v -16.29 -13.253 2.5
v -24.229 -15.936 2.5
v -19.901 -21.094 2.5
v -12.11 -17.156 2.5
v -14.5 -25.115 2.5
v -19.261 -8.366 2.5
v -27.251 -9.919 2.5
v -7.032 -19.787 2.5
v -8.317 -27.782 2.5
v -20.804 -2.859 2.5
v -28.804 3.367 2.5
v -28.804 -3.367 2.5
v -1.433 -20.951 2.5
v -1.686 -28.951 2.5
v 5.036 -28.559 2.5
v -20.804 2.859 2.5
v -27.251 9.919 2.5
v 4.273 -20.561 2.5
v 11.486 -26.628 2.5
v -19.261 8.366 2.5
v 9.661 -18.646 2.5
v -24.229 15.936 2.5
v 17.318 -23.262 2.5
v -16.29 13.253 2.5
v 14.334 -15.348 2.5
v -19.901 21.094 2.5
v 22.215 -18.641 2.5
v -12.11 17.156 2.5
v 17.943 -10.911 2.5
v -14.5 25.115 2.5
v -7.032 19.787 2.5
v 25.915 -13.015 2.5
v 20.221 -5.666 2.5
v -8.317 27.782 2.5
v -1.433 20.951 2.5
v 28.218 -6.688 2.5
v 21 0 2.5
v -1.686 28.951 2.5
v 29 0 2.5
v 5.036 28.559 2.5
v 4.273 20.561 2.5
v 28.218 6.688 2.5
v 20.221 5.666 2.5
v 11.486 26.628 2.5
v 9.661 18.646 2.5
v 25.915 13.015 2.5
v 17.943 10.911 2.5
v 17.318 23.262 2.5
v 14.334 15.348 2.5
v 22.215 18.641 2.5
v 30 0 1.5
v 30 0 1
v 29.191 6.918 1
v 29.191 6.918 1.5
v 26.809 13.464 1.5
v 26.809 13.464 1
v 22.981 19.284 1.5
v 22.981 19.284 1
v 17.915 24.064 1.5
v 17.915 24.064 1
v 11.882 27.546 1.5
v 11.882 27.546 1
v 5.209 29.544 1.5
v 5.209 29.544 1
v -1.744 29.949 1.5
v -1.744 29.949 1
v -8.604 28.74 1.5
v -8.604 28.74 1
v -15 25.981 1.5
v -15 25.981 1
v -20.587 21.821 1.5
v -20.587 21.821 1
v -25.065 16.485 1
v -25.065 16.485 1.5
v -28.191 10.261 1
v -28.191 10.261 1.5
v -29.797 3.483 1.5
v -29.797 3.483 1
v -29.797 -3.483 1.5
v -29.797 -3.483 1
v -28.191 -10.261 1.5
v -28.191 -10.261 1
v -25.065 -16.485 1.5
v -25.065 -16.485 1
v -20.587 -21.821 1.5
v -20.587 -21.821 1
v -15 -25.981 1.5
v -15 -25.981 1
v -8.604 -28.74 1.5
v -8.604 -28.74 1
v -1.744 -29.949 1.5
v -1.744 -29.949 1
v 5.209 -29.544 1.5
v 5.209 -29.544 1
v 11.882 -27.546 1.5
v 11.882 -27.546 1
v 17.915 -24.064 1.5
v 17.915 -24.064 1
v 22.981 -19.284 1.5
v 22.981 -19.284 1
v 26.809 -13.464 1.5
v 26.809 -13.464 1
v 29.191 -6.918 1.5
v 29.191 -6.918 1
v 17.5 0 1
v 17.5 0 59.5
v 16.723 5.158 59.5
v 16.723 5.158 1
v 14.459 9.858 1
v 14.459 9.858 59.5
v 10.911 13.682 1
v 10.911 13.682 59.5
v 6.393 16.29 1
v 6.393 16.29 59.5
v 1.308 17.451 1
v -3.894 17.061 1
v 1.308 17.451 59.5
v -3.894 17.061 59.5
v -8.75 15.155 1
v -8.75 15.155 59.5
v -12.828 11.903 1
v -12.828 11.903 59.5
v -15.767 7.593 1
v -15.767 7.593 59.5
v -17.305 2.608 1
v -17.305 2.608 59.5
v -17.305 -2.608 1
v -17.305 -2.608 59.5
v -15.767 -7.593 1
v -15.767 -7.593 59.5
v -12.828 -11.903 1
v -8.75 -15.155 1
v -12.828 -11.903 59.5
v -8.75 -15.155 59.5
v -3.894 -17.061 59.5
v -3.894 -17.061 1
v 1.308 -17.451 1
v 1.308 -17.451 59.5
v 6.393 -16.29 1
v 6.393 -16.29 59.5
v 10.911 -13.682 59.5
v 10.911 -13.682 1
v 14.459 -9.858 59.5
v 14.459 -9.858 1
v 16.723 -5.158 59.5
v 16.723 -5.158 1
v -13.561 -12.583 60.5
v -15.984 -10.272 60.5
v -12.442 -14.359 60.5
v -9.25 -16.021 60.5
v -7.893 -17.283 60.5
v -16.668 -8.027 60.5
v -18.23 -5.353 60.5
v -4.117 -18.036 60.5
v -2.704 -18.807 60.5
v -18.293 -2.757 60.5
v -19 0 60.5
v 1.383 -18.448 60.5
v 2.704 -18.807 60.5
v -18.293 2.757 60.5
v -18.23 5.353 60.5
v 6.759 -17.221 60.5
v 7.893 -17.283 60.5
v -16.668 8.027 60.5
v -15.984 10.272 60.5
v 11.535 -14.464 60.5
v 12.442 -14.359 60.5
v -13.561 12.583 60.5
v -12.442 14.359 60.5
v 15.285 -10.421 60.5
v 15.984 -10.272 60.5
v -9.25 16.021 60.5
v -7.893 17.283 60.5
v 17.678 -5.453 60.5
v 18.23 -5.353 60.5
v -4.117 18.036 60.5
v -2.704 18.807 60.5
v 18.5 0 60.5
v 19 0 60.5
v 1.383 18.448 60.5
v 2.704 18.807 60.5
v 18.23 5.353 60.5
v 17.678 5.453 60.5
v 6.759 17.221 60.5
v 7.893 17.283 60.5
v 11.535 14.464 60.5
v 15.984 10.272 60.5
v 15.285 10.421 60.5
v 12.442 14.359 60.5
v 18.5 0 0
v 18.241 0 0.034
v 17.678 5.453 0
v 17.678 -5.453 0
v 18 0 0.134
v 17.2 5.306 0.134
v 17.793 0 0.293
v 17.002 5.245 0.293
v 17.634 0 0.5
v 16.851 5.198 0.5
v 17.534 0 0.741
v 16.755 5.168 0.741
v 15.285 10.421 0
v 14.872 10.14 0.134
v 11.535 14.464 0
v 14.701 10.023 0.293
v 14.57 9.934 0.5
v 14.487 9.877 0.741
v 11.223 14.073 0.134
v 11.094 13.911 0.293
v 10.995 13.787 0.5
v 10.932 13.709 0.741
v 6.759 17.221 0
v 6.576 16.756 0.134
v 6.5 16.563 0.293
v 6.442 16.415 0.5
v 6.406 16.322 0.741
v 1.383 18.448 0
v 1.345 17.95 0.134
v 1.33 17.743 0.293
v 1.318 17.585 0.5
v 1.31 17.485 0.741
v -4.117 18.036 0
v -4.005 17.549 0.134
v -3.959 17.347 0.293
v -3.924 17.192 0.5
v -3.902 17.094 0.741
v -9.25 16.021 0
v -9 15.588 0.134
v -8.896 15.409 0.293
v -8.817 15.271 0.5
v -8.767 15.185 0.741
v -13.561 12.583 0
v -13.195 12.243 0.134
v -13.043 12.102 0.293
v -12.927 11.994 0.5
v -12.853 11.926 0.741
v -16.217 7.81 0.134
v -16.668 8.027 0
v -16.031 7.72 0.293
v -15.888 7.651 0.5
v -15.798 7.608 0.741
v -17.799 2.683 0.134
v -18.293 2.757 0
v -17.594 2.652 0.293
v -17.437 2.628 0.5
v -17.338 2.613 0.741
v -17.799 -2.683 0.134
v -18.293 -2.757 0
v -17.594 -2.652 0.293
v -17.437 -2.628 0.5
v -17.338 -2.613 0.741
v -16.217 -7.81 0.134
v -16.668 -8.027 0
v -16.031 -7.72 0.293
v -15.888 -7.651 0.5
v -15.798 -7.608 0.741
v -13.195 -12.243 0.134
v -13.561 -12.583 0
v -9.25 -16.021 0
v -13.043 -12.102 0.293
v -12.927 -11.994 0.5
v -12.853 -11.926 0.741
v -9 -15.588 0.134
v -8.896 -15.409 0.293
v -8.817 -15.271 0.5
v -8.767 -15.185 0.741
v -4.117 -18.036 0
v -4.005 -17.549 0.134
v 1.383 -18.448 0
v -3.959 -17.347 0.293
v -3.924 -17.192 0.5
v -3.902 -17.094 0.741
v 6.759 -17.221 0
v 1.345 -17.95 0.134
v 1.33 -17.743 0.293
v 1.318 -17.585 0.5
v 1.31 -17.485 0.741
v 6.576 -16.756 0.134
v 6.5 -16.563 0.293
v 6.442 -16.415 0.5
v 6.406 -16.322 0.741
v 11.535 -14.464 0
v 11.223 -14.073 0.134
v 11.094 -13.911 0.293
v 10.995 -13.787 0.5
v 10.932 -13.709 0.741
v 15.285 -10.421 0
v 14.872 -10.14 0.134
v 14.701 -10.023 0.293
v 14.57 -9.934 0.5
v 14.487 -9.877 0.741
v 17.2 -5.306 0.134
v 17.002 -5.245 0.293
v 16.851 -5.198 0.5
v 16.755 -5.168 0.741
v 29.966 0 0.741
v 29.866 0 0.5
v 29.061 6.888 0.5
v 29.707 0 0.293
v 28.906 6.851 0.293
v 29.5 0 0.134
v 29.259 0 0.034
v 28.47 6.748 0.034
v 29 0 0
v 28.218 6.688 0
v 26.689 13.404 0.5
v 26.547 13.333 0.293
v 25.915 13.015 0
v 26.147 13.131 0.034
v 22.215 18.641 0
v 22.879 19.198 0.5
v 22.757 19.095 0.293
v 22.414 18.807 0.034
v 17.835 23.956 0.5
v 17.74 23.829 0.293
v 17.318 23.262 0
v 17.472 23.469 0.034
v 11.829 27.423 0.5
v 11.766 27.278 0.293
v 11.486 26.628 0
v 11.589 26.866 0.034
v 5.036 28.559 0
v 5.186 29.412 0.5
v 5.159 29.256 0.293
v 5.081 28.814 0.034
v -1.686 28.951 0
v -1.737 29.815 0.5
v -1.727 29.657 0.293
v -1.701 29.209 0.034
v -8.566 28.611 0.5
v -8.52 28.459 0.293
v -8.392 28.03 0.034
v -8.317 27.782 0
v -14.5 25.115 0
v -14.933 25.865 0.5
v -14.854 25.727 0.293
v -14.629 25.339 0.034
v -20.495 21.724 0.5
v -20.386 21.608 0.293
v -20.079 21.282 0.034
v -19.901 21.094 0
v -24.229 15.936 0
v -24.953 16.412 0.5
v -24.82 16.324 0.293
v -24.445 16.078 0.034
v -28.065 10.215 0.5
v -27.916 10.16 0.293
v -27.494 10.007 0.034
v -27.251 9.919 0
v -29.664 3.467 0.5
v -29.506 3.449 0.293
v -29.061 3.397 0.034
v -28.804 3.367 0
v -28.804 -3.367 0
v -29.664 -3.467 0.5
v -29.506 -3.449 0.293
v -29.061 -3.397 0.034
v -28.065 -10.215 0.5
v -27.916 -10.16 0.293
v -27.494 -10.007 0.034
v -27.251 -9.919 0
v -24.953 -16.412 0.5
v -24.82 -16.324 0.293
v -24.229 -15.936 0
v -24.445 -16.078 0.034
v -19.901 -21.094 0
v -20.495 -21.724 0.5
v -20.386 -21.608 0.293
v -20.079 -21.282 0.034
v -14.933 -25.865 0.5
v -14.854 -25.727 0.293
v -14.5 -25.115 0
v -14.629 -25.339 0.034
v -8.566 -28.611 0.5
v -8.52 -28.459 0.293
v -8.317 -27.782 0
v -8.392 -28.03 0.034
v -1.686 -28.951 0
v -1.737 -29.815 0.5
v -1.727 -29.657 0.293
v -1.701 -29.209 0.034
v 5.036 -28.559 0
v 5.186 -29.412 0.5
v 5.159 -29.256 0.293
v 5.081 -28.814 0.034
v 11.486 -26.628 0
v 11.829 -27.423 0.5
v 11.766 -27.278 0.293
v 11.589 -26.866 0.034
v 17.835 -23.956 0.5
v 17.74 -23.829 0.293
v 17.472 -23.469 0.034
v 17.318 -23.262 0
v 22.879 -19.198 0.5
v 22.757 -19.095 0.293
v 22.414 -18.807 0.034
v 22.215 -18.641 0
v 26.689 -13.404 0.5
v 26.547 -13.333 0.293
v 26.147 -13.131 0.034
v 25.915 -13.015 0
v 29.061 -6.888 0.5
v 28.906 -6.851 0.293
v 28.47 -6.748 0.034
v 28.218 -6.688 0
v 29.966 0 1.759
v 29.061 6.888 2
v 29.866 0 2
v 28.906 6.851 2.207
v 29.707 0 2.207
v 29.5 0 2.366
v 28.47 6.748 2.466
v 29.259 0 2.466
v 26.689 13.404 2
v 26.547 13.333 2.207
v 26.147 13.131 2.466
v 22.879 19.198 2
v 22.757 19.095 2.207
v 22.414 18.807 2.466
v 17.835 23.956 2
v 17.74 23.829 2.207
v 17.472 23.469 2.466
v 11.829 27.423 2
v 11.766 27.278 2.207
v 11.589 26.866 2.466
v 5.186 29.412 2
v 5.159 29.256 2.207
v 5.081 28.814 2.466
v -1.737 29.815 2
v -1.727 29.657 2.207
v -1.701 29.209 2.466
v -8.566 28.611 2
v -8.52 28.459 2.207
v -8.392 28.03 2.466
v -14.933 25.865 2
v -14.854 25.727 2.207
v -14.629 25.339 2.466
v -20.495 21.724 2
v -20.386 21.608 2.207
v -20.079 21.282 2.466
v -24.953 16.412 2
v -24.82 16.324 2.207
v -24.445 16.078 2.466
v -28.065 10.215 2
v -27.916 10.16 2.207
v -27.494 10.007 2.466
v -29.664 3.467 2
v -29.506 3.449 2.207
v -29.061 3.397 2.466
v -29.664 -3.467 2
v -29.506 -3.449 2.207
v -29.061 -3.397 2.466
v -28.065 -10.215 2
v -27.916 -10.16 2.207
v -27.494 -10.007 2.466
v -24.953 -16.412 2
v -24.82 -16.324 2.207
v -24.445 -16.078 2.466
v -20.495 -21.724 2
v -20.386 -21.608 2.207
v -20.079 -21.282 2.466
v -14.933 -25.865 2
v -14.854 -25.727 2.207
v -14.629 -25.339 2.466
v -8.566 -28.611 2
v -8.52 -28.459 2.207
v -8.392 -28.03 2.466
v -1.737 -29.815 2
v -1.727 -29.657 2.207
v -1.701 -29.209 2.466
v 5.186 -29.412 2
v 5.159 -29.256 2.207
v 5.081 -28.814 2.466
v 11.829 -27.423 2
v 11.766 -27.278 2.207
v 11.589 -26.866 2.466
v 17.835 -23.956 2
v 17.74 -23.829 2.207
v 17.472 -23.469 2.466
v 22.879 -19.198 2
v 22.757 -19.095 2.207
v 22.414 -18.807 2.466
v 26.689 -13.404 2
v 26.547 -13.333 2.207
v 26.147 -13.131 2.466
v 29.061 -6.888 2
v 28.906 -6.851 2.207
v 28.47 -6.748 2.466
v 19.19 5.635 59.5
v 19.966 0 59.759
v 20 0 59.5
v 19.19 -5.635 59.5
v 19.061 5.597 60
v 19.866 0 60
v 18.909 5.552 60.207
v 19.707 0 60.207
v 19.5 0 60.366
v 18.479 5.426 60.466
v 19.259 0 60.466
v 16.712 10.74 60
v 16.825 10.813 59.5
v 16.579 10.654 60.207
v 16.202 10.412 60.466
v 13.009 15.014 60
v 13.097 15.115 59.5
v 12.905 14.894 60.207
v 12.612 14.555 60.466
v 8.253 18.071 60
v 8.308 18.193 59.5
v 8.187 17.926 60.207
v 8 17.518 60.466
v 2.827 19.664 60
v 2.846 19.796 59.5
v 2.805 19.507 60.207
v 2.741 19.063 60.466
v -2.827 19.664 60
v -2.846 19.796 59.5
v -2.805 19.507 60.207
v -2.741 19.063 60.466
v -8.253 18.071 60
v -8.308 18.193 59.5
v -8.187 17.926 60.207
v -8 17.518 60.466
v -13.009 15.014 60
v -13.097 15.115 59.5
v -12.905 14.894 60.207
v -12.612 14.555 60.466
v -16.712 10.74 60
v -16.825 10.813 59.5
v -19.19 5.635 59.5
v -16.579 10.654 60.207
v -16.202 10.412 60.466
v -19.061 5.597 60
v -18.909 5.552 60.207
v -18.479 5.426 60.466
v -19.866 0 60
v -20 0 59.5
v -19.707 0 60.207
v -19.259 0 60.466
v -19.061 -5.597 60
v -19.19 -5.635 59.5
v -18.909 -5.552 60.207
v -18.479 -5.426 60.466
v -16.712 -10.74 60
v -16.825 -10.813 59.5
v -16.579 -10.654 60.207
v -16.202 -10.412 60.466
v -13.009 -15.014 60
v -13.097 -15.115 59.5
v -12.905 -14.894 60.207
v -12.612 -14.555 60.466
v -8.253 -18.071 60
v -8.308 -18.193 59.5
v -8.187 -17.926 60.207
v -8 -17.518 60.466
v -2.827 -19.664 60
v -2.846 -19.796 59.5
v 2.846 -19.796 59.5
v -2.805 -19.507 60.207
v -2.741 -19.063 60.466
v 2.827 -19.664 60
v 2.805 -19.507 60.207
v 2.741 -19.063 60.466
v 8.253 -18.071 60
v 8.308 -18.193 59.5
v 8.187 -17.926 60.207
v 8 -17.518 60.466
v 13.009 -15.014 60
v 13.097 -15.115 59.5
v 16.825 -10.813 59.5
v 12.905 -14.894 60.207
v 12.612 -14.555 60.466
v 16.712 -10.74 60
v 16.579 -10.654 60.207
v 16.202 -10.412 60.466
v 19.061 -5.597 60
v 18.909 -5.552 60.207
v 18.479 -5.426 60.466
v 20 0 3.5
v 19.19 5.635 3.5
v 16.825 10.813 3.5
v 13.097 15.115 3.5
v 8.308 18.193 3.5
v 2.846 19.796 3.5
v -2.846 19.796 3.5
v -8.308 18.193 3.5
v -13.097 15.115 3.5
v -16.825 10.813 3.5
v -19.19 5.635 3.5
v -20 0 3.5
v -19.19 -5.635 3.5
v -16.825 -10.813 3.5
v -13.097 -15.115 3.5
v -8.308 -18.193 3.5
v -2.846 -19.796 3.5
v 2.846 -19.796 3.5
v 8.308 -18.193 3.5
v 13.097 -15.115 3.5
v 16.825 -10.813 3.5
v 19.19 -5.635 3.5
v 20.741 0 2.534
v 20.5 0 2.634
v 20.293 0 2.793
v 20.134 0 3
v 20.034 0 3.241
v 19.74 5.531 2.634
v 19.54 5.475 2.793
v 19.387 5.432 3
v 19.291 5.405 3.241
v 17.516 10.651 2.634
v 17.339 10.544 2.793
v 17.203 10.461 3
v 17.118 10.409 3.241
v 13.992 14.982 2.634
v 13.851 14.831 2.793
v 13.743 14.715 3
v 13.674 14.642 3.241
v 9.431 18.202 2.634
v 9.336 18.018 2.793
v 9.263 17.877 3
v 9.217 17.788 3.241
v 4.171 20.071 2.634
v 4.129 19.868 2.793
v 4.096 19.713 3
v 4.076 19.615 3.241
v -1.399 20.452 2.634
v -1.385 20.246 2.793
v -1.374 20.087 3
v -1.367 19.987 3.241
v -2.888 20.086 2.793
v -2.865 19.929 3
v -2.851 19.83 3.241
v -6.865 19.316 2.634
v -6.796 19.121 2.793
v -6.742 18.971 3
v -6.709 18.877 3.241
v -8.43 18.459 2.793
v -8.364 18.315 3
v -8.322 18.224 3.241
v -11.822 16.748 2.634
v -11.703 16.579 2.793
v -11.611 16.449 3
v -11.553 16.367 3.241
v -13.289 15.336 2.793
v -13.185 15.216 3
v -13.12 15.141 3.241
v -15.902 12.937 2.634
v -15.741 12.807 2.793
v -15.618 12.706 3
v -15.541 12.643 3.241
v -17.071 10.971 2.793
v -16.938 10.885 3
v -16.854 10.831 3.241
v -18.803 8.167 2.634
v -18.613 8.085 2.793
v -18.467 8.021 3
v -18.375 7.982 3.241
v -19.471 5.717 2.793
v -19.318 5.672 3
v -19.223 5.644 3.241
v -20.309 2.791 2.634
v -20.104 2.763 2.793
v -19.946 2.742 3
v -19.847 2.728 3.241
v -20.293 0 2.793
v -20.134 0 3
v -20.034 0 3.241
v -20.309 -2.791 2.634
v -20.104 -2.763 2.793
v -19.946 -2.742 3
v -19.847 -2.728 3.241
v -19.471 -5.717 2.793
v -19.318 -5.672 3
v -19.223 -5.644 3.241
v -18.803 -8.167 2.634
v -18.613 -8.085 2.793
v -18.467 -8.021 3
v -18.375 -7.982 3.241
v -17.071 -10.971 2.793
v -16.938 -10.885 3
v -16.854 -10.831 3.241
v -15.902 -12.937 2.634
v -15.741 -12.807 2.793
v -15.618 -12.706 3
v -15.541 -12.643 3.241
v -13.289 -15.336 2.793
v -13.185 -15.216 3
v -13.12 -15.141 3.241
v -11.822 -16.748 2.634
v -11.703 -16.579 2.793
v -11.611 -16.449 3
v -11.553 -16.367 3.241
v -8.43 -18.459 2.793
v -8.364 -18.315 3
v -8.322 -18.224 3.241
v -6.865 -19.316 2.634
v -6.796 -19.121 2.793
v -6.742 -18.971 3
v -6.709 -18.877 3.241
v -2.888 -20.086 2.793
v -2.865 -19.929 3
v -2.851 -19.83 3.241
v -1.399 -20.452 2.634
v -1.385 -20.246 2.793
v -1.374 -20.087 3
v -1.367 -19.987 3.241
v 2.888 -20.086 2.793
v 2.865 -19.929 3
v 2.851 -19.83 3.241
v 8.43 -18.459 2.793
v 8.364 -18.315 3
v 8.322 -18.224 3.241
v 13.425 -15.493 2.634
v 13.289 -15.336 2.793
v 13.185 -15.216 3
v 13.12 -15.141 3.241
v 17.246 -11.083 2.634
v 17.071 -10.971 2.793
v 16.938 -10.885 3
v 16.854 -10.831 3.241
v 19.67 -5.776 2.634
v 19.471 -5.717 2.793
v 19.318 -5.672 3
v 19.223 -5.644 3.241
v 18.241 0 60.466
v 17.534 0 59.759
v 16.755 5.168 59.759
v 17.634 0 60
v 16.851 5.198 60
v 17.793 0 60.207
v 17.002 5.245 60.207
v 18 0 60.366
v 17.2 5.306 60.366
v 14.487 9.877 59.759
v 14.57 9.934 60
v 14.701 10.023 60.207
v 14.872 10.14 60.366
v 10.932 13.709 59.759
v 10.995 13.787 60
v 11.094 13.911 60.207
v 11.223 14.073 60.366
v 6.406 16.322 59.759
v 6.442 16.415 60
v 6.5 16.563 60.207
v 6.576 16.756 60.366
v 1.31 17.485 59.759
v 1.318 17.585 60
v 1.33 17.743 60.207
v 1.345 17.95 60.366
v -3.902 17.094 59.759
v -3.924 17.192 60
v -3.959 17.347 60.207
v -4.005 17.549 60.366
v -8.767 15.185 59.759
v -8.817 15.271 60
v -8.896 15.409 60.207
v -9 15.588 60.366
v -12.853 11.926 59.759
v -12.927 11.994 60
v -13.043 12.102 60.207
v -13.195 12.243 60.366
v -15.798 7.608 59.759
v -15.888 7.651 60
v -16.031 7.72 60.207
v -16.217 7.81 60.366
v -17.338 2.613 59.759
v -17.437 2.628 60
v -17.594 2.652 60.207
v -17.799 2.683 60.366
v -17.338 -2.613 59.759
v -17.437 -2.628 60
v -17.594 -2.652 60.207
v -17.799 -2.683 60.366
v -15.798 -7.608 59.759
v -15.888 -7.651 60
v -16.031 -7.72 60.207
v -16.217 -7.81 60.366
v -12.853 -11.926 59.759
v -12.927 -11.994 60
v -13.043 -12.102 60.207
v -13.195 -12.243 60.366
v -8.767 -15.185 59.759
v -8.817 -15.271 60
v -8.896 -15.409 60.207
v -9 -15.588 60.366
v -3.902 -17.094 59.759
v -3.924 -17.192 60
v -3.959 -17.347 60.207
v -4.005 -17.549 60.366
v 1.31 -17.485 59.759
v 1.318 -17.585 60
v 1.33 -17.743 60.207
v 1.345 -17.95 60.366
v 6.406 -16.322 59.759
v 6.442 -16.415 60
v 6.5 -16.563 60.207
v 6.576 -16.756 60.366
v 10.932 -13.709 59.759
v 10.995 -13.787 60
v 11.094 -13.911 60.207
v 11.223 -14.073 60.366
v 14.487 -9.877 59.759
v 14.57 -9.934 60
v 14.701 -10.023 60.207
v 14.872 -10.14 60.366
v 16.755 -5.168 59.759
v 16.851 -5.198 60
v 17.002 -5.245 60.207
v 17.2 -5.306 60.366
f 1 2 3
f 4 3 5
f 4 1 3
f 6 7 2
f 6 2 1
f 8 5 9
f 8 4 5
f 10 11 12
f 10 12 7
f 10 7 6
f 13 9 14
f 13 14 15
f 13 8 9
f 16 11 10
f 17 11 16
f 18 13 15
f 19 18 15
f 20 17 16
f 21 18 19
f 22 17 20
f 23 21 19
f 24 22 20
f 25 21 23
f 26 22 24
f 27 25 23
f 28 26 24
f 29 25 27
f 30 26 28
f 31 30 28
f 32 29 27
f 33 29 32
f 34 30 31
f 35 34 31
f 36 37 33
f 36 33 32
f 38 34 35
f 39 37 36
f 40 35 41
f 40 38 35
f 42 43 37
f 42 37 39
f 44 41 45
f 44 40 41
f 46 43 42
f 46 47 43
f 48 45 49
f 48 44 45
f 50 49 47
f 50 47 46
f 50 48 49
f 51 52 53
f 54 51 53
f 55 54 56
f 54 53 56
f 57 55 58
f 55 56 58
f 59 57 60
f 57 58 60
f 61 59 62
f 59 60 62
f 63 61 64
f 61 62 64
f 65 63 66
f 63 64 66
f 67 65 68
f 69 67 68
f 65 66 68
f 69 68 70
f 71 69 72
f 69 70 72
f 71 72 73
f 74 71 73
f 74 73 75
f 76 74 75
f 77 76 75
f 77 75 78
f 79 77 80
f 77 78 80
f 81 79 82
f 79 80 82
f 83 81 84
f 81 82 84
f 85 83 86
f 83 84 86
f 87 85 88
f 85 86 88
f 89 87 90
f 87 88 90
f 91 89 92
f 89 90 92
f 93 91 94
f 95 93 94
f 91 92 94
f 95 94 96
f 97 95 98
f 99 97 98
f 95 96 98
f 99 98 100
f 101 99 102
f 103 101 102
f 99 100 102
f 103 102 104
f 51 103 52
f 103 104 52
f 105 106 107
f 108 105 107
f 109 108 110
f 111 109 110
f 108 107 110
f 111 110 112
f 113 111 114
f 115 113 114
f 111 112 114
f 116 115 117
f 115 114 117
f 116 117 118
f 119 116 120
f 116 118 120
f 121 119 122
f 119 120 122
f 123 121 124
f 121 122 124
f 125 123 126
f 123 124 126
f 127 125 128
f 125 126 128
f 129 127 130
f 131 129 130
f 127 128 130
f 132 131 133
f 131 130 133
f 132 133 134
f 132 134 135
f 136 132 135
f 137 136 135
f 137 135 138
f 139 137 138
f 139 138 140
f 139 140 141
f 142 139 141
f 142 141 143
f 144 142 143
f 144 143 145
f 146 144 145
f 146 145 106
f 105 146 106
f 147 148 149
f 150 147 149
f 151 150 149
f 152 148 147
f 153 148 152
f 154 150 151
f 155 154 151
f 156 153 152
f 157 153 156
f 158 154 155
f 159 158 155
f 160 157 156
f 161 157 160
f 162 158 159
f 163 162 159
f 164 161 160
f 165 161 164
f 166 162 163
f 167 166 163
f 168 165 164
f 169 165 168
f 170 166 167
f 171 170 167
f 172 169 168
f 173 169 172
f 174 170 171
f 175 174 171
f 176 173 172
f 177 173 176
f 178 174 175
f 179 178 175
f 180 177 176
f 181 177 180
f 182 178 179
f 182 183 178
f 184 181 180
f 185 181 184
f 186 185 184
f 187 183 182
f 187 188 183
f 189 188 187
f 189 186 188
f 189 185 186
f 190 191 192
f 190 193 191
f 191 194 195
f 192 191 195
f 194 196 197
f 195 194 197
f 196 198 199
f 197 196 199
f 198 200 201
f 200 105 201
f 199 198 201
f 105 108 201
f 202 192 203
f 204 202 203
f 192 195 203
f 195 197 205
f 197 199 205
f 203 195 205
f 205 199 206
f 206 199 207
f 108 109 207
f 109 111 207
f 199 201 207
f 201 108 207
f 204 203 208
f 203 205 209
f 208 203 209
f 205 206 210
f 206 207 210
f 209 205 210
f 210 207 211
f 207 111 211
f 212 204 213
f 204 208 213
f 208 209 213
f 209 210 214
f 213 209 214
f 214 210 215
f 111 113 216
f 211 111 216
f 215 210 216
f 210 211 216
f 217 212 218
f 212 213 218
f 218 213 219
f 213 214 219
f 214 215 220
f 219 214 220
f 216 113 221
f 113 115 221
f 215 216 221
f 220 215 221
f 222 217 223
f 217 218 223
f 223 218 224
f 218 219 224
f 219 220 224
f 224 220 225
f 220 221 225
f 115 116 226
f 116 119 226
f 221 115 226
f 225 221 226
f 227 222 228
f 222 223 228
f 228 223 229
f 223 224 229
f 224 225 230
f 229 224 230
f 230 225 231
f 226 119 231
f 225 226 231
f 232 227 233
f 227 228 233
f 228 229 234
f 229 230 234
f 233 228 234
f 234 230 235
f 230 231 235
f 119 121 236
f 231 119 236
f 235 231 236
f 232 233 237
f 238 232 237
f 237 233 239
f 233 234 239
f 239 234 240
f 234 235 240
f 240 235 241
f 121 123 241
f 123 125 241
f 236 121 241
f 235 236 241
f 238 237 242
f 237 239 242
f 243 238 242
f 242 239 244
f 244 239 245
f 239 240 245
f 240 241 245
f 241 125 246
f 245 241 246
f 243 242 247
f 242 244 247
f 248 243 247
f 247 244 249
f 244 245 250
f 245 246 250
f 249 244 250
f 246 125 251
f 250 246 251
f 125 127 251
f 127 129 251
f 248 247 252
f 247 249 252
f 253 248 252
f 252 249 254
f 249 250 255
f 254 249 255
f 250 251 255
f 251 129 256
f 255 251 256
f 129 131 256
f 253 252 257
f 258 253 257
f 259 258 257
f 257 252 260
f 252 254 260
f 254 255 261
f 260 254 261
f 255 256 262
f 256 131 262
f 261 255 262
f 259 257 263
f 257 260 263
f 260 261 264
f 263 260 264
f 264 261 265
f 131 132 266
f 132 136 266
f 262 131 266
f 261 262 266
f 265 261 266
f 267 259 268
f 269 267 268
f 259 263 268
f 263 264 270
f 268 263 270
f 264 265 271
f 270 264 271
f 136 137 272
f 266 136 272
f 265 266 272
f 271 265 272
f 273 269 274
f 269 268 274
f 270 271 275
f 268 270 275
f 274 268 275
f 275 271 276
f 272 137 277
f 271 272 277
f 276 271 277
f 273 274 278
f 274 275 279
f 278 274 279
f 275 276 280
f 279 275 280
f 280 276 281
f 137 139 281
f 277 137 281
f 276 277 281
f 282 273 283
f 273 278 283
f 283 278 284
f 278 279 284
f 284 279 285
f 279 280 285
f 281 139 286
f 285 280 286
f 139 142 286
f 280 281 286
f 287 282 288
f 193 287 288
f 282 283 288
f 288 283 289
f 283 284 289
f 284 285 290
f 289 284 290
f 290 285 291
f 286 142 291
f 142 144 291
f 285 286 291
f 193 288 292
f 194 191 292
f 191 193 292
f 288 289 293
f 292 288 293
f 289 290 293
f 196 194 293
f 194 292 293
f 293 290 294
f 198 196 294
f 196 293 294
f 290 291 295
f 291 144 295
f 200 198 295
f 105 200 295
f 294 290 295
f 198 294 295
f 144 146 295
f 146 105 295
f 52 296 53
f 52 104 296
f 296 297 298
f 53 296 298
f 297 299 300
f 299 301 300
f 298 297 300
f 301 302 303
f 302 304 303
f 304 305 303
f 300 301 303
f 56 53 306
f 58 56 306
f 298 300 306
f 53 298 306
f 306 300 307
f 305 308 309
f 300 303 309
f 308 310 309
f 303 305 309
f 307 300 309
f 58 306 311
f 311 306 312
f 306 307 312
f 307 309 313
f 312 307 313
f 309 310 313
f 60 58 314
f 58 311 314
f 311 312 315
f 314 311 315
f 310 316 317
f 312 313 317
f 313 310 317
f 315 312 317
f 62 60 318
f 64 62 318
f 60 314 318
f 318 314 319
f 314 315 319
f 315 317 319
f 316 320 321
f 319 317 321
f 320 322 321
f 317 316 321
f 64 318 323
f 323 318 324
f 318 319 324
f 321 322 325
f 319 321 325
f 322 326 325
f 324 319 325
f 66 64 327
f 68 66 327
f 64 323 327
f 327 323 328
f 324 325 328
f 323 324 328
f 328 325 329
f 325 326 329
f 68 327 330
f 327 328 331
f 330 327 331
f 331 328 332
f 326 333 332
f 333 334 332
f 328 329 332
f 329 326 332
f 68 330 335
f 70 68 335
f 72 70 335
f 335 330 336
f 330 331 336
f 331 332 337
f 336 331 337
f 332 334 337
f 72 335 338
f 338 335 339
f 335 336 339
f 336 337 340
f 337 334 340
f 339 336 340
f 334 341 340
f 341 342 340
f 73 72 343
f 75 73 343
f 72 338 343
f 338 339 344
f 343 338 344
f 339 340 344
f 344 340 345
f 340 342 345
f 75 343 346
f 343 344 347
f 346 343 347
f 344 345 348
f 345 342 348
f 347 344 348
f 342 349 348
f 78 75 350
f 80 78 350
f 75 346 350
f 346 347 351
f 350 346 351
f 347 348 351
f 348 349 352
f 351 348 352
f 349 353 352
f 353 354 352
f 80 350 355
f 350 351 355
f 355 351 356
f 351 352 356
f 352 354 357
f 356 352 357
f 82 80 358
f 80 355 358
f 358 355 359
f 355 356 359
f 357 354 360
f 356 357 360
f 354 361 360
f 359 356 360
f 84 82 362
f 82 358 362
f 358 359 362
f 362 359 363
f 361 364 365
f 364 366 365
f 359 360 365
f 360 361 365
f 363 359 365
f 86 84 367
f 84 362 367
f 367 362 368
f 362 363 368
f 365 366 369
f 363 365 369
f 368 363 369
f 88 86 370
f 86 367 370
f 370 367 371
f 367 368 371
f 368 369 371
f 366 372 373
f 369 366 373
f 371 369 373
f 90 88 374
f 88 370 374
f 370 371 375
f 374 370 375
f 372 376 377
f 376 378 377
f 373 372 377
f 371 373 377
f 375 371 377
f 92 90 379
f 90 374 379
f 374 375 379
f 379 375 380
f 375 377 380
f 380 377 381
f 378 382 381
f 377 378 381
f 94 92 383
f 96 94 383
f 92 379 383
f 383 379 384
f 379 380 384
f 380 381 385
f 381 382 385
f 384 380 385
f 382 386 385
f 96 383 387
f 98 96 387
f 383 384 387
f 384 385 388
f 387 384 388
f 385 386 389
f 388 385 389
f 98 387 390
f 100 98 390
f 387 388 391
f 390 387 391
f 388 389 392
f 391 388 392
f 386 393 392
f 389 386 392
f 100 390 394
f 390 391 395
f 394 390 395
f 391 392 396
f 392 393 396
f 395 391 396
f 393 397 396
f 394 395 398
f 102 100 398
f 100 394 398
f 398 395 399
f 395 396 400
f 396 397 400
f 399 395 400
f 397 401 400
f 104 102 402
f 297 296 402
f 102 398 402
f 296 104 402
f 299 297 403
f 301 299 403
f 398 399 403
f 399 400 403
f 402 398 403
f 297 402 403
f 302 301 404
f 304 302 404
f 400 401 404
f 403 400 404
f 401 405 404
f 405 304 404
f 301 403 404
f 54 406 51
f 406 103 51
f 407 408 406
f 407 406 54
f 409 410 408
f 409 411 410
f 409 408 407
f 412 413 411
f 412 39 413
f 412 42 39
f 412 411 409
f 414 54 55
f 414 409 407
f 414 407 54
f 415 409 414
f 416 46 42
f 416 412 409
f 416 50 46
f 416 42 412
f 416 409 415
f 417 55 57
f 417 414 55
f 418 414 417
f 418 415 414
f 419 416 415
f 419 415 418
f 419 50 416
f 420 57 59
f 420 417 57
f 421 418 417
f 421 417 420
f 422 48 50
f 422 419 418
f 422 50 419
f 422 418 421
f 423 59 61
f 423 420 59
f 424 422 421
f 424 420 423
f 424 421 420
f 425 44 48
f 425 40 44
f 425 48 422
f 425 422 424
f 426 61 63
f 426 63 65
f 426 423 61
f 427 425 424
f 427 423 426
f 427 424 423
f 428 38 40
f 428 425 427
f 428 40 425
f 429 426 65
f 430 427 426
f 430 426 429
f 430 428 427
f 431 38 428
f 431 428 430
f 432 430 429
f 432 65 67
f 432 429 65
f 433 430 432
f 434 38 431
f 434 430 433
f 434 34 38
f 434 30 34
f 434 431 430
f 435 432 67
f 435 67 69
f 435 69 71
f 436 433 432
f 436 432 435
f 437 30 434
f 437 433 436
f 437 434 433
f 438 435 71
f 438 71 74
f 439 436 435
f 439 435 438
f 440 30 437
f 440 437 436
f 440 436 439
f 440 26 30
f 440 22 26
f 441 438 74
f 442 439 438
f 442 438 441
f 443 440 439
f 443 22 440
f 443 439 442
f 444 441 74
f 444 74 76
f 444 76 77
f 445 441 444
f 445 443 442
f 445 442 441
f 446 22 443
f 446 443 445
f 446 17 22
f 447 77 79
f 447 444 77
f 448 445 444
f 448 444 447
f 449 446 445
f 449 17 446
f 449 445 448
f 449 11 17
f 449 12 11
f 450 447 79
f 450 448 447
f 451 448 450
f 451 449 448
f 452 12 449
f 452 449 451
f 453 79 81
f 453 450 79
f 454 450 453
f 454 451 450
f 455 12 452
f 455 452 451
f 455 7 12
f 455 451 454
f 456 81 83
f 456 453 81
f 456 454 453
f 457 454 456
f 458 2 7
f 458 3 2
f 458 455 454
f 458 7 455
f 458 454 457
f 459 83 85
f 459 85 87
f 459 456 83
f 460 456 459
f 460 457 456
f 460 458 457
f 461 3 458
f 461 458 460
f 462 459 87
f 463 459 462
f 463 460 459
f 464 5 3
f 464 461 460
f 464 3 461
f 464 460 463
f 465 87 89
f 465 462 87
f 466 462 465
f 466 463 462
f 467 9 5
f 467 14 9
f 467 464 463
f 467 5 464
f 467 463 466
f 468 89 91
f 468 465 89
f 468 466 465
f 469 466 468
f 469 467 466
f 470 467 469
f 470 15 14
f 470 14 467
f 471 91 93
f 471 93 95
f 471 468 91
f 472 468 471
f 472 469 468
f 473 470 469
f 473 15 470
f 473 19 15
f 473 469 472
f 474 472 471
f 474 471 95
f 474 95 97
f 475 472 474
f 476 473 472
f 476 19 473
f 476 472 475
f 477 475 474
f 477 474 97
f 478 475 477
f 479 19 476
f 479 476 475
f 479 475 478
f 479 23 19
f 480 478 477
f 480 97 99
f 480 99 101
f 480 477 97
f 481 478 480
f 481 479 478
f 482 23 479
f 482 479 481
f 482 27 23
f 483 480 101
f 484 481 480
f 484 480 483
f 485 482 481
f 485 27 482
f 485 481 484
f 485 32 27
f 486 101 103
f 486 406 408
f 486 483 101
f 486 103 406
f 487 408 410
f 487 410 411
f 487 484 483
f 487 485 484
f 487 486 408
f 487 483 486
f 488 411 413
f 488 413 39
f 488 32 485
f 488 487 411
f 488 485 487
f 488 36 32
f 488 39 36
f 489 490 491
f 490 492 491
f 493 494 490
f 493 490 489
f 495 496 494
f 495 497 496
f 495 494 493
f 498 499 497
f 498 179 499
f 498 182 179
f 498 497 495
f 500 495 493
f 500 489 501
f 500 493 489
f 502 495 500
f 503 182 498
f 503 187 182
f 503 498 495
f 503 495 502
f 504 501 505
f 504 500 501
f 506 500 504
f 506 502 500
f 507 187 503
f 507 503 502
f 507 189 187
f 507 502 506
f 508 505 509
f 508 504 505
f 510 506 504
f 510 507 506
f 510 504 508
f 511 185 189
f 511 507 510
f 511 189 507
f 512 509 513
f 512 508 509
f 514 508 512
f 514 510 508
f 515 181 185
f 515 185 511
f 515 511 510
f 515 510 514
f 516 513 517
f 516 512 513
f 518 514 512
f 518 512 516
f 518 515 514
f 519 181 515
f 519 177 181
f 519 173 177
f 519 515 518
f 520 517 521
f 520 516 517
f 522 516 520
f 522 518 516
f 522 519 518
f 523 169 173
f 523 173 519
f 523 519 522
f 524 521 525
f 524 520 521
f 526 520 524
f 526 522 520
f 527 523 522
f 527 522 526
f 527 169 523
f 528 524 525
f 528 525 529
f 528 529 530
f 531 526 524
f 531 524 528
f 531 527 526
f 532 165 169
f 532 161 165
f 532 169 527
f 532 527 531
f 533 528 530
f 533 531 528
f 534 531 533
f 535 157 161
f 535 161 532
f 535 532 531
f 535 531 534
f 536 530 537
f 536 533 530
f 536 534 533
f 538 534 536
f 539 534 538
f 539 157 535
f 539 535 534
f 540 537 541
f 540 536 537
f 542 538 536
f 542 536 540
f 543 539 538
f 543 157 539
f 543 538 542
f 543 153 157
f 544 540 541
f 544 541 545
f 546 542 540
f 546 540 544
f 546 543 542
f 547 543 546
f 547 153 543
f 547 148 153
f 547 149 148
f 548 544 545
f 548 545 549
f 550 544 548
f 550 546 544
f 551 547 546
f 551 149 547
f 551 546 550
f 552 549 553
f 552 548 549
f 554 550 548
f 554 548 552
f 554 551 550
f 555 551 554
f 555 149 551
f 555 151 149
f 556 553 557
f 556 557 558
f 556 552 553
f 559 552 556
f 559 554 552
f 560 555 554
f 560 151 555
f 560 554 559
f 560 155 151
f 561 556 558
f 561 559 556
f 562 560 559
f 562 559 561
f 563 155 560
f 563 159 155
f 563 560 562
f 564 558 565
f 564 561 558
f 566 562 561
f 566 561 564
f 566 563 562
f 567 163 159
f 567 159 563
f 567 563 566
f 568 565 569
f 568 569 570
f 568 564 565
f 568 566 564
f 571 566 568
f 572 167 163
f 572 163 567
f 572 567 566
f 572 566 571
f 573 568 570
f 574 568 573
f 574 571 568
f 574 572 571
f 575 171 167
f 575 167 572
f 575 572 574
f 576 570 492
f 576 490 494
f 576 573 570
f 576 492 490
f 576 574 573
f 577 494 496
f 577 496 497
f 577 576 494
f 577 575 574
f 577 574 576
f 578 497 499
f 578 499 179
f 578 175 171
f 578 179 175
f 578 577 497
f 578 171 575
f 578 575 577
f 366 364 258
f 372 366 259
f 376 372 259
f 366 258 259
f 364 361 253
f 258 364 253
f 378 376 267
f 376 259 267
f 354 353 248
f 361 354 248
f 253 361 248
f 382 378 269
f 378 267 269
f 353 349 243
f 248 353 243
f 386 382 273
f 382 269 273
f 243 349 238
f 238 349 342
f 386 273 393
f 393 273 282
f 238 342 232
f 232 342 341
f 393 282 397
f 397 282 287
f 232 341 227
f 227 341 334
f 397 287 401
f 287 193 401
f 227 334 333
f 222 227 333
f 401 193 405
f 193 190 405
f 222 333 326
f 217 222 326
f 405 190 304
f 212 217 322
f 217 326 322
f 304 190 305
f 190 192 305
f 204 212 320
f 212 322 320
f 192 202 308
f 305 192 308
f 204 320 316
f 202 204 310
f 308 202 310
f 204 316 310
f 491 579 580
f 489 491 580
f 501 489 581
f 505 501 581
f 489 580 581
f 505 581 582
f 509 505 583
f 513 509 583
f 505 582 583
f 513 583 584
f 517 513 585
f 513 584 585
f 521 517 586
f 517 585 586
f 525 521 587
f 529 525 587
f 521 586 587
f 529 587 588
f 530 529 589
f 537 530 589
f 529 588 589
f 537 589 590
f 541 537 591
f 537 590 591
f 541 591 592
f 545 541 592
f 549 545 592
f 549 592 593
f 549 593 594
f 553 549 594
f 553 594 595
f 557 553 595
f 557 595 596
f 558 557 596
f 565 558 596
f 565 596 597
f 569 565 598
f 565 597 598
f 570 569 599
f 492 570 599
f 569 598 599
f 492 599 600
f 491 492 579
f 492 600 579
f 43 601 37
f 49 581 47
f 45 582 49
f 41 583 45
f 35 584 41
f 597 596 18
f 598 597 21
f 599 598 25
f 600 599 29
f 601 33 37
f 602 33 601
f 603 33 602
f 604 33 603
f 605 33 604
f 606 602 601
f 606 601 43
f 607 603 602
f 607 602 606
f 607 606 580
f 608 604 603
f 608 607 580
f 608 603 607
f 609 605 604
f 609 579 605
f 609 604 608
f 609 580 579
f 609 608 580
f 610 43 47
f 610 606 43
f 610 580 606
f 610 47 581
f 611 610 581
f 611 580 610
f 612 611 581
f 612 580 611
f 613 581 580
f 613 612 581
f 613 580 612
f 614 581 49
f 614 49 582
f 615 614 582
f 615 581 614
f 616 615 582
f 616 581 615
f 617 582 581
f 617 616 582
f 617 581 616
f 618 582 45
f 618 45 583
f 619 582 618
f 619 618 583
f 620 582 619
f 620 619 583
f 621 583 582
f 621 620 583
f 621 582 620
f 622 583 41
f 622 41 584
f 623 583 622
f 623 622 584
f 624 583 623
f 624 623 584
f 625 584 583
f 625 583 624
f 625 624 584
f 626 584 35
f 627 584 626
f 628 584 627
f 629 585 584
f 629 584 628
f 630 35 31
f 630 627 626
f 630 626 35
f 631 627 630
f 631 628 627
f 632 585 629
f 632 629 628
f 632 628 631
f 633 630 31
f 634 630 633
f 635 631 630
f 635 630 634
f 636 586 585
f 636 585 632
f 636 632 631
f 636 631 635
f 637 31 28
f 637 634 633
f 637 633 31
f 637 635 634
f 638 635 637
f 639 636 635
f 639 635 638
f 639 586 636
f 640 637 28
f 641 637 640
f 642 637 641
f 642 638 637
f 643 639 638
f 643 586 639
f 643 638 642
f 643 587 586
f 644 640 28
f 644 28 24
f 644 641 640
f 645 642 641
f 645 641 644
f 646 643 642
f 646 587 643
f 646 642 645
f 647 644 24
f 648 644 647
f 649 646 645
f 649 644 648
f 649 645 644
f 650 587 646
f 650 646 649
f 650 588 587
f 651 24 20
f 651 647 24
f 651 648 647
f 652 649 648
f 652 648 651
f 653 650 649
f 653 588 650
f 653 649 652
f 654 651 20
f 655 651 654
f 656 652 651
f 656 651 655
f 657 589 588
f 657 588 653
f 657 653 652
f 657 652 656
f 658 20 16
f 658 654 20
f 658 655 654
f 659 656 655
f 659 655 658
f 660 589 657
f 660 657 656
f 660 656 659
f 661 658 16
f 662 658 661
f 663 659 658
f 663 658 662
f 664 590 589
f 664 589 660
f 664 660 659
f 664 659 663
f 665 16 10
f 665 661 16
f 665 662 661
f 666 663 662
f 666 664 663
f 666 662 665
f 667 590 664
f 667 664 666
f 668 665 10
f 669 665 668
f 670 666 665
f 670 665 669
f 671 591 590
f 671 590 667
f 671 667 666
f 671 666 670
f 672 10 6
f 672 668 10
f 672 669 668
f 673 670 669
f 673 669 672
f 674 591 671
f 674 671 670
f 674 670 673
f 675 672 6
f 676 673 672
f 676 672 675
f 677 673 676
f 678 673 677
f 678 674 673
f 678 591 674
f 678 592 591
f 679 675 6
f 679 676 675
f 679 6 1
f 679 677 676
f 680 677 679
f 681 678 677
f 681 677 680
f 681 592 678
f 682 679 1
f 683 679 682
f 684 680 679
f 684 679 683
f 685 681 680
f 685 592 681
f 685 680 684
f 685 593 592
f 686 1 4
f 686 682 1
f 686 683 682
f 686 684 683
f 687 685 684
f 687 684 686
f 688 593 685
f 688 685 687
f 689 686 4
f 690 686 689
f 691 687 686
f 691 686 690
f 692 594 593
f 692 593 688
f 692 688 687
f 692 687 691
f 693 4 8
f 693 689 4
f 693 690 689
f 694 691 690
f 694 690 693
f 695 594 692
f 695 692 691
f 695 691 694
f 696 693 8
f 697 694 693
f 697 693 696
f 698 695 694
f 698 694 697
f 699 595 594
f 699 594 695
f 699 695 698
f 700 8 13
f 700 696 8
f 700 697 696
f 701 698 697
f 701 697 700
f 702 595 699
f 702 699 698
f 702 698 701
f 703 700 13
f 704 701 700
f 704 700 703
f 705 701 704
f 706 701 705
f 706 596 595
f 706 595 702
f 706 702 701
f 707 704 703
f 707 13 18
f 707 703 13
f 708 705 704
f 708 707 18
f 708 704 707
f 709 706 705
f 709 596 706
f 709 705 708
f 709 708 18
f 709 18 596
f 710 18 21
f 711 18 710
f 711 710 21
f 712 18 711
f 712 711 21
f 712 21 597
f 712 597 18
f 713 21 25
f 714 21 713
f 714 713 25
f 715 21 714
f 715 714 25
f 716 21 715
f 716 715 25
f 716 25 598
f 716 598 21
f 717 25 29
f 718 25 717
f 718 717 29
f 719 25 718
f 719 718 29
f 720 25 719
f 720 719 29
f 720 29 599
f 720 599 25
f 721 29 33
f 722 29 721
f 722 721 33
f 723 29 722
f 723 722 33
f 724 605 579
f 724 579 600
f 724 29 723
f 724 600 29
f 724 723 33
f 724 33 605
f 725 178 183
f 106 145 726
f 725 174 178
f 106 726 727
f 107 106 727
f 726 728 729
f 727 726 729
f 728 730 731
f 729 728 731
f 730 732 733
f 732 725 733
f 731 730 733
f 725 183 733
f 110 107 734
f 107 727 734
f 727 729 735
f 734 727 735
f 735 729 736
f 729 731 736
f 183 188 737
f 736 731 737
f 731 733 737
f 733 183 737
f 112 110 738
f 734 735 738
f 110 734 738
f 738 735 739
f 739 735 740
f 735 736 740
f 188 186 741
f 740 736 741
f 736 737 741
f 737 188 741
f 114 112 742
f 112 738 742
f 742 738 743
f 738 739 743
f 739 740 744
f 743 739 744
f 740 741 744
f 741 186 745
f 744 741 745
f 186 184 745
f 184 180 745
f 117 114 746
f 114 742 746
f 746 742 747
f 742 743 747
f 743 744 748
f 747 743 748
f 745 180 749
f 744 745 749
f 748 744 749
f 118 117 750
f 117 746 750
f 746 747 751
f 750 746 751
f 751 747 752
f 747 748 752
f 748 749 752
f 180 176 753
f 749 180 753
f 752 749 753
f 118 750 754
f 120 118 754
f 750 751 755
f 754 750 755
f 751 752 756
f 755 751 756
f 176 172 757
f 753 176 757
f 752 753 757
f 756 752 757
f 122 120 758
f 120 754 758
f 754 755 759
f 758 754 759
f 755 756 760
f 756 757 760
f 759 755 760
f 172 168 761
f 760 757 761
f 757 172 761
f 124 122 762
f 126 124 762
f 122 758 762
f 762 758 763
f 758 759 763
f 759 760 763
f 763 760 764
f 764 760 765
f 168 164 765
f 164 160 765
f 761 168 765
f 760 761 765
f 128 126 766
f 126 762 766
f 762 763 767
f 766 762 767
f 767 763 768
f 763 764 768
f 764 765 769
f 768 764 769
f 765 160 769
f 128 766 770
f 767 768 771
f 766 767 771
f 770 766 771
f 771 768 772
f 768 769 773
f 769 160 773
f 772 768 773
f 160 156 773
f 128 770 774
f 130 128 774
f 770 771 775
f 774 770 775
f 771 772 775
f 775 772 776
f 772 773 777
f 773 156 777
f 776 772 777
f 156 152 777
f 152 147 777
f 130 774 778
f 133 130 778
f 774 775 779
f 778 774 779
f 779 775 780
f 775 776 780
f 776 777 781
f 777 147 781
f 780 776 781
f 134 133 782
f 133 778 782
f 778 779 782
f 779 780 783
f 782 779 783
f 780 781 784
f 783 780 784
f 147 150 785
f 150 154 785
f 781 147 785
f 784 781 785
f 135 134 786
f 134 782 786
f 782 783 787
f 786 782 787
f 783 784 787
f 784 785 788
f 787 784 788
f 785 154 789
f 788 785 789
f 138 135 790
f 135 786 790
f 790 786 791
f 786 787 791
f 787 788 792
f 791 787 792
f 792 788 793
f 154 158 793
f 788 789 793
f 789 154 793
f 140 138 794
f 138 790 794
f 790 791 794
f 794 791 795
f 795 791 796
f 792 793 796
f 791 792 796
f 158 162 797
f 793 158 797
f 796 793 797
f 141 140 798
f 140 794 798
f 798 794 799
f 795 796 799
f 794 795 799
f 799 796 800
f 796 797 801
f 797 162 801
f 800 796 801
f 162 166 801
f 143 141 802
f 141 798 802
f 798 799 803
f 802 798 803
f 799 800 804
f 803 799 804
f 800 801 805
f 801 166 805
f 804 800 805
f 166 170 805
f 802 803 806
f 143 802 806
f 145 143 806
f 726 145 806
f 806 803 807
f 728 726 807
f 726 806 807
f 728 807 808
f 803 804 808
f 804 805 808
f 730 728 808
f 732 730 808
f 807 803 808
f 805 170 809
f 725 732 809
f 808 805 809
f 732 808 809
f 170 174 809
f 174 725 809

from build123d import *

# Parameters (mm, degrees)
SKETCH_R     = 30
PAD_DEPTH    = 2.5
SKETCH001_R  = 20
PAD001_DEPTH = 58
SKETCH002_R  = 17.5
POCKET_DEPTH = 60.501
FILLET_R     = 1


with BuildPart() as part:
    # Sketch (on XY_Plane of Origin) → Pad (new body)
    with BuildSketch(Plane.XY):
        Circle(SKETCH_R)
    extrude(amount=PAD_DEPTH)

    # Sketch001 (on Face3 of Pad) → Pad001 (join)
    with BuildSketch(Plane.XY.offset(2.5)):
        Circle(SKETCH001_R)
    extrude(amount=PAD001_DEPTH)

    # Sketch002 (on Face5 of Pad001) → Pocket (cut, through all)
    with BuildSketch(Plane.XY.offset(60.5)):
        Circle(SKETCH002_R)
    extrude(amount=-POCKET_DEPTH, mode=Mode.SUBTRACT)

    # Fillet
    fillet_edges = [part.edges().sort_by_distance(p)[0] for p in [
        (30, 0, 1.25),
        (-30, 0, 0),
        (-30, 0, 2.5),
        (-17.5, 0, 0),
        (-20, 0, 2.5),
        (-17.5, 0, 60.5),
        (17.5, 0, 30.25),
        (20, 0, 31.5),
        (-20, 0, 60.5),
    ]]
    fillet(fillet_edges, radius=FILLET_R)


solid = part.part
